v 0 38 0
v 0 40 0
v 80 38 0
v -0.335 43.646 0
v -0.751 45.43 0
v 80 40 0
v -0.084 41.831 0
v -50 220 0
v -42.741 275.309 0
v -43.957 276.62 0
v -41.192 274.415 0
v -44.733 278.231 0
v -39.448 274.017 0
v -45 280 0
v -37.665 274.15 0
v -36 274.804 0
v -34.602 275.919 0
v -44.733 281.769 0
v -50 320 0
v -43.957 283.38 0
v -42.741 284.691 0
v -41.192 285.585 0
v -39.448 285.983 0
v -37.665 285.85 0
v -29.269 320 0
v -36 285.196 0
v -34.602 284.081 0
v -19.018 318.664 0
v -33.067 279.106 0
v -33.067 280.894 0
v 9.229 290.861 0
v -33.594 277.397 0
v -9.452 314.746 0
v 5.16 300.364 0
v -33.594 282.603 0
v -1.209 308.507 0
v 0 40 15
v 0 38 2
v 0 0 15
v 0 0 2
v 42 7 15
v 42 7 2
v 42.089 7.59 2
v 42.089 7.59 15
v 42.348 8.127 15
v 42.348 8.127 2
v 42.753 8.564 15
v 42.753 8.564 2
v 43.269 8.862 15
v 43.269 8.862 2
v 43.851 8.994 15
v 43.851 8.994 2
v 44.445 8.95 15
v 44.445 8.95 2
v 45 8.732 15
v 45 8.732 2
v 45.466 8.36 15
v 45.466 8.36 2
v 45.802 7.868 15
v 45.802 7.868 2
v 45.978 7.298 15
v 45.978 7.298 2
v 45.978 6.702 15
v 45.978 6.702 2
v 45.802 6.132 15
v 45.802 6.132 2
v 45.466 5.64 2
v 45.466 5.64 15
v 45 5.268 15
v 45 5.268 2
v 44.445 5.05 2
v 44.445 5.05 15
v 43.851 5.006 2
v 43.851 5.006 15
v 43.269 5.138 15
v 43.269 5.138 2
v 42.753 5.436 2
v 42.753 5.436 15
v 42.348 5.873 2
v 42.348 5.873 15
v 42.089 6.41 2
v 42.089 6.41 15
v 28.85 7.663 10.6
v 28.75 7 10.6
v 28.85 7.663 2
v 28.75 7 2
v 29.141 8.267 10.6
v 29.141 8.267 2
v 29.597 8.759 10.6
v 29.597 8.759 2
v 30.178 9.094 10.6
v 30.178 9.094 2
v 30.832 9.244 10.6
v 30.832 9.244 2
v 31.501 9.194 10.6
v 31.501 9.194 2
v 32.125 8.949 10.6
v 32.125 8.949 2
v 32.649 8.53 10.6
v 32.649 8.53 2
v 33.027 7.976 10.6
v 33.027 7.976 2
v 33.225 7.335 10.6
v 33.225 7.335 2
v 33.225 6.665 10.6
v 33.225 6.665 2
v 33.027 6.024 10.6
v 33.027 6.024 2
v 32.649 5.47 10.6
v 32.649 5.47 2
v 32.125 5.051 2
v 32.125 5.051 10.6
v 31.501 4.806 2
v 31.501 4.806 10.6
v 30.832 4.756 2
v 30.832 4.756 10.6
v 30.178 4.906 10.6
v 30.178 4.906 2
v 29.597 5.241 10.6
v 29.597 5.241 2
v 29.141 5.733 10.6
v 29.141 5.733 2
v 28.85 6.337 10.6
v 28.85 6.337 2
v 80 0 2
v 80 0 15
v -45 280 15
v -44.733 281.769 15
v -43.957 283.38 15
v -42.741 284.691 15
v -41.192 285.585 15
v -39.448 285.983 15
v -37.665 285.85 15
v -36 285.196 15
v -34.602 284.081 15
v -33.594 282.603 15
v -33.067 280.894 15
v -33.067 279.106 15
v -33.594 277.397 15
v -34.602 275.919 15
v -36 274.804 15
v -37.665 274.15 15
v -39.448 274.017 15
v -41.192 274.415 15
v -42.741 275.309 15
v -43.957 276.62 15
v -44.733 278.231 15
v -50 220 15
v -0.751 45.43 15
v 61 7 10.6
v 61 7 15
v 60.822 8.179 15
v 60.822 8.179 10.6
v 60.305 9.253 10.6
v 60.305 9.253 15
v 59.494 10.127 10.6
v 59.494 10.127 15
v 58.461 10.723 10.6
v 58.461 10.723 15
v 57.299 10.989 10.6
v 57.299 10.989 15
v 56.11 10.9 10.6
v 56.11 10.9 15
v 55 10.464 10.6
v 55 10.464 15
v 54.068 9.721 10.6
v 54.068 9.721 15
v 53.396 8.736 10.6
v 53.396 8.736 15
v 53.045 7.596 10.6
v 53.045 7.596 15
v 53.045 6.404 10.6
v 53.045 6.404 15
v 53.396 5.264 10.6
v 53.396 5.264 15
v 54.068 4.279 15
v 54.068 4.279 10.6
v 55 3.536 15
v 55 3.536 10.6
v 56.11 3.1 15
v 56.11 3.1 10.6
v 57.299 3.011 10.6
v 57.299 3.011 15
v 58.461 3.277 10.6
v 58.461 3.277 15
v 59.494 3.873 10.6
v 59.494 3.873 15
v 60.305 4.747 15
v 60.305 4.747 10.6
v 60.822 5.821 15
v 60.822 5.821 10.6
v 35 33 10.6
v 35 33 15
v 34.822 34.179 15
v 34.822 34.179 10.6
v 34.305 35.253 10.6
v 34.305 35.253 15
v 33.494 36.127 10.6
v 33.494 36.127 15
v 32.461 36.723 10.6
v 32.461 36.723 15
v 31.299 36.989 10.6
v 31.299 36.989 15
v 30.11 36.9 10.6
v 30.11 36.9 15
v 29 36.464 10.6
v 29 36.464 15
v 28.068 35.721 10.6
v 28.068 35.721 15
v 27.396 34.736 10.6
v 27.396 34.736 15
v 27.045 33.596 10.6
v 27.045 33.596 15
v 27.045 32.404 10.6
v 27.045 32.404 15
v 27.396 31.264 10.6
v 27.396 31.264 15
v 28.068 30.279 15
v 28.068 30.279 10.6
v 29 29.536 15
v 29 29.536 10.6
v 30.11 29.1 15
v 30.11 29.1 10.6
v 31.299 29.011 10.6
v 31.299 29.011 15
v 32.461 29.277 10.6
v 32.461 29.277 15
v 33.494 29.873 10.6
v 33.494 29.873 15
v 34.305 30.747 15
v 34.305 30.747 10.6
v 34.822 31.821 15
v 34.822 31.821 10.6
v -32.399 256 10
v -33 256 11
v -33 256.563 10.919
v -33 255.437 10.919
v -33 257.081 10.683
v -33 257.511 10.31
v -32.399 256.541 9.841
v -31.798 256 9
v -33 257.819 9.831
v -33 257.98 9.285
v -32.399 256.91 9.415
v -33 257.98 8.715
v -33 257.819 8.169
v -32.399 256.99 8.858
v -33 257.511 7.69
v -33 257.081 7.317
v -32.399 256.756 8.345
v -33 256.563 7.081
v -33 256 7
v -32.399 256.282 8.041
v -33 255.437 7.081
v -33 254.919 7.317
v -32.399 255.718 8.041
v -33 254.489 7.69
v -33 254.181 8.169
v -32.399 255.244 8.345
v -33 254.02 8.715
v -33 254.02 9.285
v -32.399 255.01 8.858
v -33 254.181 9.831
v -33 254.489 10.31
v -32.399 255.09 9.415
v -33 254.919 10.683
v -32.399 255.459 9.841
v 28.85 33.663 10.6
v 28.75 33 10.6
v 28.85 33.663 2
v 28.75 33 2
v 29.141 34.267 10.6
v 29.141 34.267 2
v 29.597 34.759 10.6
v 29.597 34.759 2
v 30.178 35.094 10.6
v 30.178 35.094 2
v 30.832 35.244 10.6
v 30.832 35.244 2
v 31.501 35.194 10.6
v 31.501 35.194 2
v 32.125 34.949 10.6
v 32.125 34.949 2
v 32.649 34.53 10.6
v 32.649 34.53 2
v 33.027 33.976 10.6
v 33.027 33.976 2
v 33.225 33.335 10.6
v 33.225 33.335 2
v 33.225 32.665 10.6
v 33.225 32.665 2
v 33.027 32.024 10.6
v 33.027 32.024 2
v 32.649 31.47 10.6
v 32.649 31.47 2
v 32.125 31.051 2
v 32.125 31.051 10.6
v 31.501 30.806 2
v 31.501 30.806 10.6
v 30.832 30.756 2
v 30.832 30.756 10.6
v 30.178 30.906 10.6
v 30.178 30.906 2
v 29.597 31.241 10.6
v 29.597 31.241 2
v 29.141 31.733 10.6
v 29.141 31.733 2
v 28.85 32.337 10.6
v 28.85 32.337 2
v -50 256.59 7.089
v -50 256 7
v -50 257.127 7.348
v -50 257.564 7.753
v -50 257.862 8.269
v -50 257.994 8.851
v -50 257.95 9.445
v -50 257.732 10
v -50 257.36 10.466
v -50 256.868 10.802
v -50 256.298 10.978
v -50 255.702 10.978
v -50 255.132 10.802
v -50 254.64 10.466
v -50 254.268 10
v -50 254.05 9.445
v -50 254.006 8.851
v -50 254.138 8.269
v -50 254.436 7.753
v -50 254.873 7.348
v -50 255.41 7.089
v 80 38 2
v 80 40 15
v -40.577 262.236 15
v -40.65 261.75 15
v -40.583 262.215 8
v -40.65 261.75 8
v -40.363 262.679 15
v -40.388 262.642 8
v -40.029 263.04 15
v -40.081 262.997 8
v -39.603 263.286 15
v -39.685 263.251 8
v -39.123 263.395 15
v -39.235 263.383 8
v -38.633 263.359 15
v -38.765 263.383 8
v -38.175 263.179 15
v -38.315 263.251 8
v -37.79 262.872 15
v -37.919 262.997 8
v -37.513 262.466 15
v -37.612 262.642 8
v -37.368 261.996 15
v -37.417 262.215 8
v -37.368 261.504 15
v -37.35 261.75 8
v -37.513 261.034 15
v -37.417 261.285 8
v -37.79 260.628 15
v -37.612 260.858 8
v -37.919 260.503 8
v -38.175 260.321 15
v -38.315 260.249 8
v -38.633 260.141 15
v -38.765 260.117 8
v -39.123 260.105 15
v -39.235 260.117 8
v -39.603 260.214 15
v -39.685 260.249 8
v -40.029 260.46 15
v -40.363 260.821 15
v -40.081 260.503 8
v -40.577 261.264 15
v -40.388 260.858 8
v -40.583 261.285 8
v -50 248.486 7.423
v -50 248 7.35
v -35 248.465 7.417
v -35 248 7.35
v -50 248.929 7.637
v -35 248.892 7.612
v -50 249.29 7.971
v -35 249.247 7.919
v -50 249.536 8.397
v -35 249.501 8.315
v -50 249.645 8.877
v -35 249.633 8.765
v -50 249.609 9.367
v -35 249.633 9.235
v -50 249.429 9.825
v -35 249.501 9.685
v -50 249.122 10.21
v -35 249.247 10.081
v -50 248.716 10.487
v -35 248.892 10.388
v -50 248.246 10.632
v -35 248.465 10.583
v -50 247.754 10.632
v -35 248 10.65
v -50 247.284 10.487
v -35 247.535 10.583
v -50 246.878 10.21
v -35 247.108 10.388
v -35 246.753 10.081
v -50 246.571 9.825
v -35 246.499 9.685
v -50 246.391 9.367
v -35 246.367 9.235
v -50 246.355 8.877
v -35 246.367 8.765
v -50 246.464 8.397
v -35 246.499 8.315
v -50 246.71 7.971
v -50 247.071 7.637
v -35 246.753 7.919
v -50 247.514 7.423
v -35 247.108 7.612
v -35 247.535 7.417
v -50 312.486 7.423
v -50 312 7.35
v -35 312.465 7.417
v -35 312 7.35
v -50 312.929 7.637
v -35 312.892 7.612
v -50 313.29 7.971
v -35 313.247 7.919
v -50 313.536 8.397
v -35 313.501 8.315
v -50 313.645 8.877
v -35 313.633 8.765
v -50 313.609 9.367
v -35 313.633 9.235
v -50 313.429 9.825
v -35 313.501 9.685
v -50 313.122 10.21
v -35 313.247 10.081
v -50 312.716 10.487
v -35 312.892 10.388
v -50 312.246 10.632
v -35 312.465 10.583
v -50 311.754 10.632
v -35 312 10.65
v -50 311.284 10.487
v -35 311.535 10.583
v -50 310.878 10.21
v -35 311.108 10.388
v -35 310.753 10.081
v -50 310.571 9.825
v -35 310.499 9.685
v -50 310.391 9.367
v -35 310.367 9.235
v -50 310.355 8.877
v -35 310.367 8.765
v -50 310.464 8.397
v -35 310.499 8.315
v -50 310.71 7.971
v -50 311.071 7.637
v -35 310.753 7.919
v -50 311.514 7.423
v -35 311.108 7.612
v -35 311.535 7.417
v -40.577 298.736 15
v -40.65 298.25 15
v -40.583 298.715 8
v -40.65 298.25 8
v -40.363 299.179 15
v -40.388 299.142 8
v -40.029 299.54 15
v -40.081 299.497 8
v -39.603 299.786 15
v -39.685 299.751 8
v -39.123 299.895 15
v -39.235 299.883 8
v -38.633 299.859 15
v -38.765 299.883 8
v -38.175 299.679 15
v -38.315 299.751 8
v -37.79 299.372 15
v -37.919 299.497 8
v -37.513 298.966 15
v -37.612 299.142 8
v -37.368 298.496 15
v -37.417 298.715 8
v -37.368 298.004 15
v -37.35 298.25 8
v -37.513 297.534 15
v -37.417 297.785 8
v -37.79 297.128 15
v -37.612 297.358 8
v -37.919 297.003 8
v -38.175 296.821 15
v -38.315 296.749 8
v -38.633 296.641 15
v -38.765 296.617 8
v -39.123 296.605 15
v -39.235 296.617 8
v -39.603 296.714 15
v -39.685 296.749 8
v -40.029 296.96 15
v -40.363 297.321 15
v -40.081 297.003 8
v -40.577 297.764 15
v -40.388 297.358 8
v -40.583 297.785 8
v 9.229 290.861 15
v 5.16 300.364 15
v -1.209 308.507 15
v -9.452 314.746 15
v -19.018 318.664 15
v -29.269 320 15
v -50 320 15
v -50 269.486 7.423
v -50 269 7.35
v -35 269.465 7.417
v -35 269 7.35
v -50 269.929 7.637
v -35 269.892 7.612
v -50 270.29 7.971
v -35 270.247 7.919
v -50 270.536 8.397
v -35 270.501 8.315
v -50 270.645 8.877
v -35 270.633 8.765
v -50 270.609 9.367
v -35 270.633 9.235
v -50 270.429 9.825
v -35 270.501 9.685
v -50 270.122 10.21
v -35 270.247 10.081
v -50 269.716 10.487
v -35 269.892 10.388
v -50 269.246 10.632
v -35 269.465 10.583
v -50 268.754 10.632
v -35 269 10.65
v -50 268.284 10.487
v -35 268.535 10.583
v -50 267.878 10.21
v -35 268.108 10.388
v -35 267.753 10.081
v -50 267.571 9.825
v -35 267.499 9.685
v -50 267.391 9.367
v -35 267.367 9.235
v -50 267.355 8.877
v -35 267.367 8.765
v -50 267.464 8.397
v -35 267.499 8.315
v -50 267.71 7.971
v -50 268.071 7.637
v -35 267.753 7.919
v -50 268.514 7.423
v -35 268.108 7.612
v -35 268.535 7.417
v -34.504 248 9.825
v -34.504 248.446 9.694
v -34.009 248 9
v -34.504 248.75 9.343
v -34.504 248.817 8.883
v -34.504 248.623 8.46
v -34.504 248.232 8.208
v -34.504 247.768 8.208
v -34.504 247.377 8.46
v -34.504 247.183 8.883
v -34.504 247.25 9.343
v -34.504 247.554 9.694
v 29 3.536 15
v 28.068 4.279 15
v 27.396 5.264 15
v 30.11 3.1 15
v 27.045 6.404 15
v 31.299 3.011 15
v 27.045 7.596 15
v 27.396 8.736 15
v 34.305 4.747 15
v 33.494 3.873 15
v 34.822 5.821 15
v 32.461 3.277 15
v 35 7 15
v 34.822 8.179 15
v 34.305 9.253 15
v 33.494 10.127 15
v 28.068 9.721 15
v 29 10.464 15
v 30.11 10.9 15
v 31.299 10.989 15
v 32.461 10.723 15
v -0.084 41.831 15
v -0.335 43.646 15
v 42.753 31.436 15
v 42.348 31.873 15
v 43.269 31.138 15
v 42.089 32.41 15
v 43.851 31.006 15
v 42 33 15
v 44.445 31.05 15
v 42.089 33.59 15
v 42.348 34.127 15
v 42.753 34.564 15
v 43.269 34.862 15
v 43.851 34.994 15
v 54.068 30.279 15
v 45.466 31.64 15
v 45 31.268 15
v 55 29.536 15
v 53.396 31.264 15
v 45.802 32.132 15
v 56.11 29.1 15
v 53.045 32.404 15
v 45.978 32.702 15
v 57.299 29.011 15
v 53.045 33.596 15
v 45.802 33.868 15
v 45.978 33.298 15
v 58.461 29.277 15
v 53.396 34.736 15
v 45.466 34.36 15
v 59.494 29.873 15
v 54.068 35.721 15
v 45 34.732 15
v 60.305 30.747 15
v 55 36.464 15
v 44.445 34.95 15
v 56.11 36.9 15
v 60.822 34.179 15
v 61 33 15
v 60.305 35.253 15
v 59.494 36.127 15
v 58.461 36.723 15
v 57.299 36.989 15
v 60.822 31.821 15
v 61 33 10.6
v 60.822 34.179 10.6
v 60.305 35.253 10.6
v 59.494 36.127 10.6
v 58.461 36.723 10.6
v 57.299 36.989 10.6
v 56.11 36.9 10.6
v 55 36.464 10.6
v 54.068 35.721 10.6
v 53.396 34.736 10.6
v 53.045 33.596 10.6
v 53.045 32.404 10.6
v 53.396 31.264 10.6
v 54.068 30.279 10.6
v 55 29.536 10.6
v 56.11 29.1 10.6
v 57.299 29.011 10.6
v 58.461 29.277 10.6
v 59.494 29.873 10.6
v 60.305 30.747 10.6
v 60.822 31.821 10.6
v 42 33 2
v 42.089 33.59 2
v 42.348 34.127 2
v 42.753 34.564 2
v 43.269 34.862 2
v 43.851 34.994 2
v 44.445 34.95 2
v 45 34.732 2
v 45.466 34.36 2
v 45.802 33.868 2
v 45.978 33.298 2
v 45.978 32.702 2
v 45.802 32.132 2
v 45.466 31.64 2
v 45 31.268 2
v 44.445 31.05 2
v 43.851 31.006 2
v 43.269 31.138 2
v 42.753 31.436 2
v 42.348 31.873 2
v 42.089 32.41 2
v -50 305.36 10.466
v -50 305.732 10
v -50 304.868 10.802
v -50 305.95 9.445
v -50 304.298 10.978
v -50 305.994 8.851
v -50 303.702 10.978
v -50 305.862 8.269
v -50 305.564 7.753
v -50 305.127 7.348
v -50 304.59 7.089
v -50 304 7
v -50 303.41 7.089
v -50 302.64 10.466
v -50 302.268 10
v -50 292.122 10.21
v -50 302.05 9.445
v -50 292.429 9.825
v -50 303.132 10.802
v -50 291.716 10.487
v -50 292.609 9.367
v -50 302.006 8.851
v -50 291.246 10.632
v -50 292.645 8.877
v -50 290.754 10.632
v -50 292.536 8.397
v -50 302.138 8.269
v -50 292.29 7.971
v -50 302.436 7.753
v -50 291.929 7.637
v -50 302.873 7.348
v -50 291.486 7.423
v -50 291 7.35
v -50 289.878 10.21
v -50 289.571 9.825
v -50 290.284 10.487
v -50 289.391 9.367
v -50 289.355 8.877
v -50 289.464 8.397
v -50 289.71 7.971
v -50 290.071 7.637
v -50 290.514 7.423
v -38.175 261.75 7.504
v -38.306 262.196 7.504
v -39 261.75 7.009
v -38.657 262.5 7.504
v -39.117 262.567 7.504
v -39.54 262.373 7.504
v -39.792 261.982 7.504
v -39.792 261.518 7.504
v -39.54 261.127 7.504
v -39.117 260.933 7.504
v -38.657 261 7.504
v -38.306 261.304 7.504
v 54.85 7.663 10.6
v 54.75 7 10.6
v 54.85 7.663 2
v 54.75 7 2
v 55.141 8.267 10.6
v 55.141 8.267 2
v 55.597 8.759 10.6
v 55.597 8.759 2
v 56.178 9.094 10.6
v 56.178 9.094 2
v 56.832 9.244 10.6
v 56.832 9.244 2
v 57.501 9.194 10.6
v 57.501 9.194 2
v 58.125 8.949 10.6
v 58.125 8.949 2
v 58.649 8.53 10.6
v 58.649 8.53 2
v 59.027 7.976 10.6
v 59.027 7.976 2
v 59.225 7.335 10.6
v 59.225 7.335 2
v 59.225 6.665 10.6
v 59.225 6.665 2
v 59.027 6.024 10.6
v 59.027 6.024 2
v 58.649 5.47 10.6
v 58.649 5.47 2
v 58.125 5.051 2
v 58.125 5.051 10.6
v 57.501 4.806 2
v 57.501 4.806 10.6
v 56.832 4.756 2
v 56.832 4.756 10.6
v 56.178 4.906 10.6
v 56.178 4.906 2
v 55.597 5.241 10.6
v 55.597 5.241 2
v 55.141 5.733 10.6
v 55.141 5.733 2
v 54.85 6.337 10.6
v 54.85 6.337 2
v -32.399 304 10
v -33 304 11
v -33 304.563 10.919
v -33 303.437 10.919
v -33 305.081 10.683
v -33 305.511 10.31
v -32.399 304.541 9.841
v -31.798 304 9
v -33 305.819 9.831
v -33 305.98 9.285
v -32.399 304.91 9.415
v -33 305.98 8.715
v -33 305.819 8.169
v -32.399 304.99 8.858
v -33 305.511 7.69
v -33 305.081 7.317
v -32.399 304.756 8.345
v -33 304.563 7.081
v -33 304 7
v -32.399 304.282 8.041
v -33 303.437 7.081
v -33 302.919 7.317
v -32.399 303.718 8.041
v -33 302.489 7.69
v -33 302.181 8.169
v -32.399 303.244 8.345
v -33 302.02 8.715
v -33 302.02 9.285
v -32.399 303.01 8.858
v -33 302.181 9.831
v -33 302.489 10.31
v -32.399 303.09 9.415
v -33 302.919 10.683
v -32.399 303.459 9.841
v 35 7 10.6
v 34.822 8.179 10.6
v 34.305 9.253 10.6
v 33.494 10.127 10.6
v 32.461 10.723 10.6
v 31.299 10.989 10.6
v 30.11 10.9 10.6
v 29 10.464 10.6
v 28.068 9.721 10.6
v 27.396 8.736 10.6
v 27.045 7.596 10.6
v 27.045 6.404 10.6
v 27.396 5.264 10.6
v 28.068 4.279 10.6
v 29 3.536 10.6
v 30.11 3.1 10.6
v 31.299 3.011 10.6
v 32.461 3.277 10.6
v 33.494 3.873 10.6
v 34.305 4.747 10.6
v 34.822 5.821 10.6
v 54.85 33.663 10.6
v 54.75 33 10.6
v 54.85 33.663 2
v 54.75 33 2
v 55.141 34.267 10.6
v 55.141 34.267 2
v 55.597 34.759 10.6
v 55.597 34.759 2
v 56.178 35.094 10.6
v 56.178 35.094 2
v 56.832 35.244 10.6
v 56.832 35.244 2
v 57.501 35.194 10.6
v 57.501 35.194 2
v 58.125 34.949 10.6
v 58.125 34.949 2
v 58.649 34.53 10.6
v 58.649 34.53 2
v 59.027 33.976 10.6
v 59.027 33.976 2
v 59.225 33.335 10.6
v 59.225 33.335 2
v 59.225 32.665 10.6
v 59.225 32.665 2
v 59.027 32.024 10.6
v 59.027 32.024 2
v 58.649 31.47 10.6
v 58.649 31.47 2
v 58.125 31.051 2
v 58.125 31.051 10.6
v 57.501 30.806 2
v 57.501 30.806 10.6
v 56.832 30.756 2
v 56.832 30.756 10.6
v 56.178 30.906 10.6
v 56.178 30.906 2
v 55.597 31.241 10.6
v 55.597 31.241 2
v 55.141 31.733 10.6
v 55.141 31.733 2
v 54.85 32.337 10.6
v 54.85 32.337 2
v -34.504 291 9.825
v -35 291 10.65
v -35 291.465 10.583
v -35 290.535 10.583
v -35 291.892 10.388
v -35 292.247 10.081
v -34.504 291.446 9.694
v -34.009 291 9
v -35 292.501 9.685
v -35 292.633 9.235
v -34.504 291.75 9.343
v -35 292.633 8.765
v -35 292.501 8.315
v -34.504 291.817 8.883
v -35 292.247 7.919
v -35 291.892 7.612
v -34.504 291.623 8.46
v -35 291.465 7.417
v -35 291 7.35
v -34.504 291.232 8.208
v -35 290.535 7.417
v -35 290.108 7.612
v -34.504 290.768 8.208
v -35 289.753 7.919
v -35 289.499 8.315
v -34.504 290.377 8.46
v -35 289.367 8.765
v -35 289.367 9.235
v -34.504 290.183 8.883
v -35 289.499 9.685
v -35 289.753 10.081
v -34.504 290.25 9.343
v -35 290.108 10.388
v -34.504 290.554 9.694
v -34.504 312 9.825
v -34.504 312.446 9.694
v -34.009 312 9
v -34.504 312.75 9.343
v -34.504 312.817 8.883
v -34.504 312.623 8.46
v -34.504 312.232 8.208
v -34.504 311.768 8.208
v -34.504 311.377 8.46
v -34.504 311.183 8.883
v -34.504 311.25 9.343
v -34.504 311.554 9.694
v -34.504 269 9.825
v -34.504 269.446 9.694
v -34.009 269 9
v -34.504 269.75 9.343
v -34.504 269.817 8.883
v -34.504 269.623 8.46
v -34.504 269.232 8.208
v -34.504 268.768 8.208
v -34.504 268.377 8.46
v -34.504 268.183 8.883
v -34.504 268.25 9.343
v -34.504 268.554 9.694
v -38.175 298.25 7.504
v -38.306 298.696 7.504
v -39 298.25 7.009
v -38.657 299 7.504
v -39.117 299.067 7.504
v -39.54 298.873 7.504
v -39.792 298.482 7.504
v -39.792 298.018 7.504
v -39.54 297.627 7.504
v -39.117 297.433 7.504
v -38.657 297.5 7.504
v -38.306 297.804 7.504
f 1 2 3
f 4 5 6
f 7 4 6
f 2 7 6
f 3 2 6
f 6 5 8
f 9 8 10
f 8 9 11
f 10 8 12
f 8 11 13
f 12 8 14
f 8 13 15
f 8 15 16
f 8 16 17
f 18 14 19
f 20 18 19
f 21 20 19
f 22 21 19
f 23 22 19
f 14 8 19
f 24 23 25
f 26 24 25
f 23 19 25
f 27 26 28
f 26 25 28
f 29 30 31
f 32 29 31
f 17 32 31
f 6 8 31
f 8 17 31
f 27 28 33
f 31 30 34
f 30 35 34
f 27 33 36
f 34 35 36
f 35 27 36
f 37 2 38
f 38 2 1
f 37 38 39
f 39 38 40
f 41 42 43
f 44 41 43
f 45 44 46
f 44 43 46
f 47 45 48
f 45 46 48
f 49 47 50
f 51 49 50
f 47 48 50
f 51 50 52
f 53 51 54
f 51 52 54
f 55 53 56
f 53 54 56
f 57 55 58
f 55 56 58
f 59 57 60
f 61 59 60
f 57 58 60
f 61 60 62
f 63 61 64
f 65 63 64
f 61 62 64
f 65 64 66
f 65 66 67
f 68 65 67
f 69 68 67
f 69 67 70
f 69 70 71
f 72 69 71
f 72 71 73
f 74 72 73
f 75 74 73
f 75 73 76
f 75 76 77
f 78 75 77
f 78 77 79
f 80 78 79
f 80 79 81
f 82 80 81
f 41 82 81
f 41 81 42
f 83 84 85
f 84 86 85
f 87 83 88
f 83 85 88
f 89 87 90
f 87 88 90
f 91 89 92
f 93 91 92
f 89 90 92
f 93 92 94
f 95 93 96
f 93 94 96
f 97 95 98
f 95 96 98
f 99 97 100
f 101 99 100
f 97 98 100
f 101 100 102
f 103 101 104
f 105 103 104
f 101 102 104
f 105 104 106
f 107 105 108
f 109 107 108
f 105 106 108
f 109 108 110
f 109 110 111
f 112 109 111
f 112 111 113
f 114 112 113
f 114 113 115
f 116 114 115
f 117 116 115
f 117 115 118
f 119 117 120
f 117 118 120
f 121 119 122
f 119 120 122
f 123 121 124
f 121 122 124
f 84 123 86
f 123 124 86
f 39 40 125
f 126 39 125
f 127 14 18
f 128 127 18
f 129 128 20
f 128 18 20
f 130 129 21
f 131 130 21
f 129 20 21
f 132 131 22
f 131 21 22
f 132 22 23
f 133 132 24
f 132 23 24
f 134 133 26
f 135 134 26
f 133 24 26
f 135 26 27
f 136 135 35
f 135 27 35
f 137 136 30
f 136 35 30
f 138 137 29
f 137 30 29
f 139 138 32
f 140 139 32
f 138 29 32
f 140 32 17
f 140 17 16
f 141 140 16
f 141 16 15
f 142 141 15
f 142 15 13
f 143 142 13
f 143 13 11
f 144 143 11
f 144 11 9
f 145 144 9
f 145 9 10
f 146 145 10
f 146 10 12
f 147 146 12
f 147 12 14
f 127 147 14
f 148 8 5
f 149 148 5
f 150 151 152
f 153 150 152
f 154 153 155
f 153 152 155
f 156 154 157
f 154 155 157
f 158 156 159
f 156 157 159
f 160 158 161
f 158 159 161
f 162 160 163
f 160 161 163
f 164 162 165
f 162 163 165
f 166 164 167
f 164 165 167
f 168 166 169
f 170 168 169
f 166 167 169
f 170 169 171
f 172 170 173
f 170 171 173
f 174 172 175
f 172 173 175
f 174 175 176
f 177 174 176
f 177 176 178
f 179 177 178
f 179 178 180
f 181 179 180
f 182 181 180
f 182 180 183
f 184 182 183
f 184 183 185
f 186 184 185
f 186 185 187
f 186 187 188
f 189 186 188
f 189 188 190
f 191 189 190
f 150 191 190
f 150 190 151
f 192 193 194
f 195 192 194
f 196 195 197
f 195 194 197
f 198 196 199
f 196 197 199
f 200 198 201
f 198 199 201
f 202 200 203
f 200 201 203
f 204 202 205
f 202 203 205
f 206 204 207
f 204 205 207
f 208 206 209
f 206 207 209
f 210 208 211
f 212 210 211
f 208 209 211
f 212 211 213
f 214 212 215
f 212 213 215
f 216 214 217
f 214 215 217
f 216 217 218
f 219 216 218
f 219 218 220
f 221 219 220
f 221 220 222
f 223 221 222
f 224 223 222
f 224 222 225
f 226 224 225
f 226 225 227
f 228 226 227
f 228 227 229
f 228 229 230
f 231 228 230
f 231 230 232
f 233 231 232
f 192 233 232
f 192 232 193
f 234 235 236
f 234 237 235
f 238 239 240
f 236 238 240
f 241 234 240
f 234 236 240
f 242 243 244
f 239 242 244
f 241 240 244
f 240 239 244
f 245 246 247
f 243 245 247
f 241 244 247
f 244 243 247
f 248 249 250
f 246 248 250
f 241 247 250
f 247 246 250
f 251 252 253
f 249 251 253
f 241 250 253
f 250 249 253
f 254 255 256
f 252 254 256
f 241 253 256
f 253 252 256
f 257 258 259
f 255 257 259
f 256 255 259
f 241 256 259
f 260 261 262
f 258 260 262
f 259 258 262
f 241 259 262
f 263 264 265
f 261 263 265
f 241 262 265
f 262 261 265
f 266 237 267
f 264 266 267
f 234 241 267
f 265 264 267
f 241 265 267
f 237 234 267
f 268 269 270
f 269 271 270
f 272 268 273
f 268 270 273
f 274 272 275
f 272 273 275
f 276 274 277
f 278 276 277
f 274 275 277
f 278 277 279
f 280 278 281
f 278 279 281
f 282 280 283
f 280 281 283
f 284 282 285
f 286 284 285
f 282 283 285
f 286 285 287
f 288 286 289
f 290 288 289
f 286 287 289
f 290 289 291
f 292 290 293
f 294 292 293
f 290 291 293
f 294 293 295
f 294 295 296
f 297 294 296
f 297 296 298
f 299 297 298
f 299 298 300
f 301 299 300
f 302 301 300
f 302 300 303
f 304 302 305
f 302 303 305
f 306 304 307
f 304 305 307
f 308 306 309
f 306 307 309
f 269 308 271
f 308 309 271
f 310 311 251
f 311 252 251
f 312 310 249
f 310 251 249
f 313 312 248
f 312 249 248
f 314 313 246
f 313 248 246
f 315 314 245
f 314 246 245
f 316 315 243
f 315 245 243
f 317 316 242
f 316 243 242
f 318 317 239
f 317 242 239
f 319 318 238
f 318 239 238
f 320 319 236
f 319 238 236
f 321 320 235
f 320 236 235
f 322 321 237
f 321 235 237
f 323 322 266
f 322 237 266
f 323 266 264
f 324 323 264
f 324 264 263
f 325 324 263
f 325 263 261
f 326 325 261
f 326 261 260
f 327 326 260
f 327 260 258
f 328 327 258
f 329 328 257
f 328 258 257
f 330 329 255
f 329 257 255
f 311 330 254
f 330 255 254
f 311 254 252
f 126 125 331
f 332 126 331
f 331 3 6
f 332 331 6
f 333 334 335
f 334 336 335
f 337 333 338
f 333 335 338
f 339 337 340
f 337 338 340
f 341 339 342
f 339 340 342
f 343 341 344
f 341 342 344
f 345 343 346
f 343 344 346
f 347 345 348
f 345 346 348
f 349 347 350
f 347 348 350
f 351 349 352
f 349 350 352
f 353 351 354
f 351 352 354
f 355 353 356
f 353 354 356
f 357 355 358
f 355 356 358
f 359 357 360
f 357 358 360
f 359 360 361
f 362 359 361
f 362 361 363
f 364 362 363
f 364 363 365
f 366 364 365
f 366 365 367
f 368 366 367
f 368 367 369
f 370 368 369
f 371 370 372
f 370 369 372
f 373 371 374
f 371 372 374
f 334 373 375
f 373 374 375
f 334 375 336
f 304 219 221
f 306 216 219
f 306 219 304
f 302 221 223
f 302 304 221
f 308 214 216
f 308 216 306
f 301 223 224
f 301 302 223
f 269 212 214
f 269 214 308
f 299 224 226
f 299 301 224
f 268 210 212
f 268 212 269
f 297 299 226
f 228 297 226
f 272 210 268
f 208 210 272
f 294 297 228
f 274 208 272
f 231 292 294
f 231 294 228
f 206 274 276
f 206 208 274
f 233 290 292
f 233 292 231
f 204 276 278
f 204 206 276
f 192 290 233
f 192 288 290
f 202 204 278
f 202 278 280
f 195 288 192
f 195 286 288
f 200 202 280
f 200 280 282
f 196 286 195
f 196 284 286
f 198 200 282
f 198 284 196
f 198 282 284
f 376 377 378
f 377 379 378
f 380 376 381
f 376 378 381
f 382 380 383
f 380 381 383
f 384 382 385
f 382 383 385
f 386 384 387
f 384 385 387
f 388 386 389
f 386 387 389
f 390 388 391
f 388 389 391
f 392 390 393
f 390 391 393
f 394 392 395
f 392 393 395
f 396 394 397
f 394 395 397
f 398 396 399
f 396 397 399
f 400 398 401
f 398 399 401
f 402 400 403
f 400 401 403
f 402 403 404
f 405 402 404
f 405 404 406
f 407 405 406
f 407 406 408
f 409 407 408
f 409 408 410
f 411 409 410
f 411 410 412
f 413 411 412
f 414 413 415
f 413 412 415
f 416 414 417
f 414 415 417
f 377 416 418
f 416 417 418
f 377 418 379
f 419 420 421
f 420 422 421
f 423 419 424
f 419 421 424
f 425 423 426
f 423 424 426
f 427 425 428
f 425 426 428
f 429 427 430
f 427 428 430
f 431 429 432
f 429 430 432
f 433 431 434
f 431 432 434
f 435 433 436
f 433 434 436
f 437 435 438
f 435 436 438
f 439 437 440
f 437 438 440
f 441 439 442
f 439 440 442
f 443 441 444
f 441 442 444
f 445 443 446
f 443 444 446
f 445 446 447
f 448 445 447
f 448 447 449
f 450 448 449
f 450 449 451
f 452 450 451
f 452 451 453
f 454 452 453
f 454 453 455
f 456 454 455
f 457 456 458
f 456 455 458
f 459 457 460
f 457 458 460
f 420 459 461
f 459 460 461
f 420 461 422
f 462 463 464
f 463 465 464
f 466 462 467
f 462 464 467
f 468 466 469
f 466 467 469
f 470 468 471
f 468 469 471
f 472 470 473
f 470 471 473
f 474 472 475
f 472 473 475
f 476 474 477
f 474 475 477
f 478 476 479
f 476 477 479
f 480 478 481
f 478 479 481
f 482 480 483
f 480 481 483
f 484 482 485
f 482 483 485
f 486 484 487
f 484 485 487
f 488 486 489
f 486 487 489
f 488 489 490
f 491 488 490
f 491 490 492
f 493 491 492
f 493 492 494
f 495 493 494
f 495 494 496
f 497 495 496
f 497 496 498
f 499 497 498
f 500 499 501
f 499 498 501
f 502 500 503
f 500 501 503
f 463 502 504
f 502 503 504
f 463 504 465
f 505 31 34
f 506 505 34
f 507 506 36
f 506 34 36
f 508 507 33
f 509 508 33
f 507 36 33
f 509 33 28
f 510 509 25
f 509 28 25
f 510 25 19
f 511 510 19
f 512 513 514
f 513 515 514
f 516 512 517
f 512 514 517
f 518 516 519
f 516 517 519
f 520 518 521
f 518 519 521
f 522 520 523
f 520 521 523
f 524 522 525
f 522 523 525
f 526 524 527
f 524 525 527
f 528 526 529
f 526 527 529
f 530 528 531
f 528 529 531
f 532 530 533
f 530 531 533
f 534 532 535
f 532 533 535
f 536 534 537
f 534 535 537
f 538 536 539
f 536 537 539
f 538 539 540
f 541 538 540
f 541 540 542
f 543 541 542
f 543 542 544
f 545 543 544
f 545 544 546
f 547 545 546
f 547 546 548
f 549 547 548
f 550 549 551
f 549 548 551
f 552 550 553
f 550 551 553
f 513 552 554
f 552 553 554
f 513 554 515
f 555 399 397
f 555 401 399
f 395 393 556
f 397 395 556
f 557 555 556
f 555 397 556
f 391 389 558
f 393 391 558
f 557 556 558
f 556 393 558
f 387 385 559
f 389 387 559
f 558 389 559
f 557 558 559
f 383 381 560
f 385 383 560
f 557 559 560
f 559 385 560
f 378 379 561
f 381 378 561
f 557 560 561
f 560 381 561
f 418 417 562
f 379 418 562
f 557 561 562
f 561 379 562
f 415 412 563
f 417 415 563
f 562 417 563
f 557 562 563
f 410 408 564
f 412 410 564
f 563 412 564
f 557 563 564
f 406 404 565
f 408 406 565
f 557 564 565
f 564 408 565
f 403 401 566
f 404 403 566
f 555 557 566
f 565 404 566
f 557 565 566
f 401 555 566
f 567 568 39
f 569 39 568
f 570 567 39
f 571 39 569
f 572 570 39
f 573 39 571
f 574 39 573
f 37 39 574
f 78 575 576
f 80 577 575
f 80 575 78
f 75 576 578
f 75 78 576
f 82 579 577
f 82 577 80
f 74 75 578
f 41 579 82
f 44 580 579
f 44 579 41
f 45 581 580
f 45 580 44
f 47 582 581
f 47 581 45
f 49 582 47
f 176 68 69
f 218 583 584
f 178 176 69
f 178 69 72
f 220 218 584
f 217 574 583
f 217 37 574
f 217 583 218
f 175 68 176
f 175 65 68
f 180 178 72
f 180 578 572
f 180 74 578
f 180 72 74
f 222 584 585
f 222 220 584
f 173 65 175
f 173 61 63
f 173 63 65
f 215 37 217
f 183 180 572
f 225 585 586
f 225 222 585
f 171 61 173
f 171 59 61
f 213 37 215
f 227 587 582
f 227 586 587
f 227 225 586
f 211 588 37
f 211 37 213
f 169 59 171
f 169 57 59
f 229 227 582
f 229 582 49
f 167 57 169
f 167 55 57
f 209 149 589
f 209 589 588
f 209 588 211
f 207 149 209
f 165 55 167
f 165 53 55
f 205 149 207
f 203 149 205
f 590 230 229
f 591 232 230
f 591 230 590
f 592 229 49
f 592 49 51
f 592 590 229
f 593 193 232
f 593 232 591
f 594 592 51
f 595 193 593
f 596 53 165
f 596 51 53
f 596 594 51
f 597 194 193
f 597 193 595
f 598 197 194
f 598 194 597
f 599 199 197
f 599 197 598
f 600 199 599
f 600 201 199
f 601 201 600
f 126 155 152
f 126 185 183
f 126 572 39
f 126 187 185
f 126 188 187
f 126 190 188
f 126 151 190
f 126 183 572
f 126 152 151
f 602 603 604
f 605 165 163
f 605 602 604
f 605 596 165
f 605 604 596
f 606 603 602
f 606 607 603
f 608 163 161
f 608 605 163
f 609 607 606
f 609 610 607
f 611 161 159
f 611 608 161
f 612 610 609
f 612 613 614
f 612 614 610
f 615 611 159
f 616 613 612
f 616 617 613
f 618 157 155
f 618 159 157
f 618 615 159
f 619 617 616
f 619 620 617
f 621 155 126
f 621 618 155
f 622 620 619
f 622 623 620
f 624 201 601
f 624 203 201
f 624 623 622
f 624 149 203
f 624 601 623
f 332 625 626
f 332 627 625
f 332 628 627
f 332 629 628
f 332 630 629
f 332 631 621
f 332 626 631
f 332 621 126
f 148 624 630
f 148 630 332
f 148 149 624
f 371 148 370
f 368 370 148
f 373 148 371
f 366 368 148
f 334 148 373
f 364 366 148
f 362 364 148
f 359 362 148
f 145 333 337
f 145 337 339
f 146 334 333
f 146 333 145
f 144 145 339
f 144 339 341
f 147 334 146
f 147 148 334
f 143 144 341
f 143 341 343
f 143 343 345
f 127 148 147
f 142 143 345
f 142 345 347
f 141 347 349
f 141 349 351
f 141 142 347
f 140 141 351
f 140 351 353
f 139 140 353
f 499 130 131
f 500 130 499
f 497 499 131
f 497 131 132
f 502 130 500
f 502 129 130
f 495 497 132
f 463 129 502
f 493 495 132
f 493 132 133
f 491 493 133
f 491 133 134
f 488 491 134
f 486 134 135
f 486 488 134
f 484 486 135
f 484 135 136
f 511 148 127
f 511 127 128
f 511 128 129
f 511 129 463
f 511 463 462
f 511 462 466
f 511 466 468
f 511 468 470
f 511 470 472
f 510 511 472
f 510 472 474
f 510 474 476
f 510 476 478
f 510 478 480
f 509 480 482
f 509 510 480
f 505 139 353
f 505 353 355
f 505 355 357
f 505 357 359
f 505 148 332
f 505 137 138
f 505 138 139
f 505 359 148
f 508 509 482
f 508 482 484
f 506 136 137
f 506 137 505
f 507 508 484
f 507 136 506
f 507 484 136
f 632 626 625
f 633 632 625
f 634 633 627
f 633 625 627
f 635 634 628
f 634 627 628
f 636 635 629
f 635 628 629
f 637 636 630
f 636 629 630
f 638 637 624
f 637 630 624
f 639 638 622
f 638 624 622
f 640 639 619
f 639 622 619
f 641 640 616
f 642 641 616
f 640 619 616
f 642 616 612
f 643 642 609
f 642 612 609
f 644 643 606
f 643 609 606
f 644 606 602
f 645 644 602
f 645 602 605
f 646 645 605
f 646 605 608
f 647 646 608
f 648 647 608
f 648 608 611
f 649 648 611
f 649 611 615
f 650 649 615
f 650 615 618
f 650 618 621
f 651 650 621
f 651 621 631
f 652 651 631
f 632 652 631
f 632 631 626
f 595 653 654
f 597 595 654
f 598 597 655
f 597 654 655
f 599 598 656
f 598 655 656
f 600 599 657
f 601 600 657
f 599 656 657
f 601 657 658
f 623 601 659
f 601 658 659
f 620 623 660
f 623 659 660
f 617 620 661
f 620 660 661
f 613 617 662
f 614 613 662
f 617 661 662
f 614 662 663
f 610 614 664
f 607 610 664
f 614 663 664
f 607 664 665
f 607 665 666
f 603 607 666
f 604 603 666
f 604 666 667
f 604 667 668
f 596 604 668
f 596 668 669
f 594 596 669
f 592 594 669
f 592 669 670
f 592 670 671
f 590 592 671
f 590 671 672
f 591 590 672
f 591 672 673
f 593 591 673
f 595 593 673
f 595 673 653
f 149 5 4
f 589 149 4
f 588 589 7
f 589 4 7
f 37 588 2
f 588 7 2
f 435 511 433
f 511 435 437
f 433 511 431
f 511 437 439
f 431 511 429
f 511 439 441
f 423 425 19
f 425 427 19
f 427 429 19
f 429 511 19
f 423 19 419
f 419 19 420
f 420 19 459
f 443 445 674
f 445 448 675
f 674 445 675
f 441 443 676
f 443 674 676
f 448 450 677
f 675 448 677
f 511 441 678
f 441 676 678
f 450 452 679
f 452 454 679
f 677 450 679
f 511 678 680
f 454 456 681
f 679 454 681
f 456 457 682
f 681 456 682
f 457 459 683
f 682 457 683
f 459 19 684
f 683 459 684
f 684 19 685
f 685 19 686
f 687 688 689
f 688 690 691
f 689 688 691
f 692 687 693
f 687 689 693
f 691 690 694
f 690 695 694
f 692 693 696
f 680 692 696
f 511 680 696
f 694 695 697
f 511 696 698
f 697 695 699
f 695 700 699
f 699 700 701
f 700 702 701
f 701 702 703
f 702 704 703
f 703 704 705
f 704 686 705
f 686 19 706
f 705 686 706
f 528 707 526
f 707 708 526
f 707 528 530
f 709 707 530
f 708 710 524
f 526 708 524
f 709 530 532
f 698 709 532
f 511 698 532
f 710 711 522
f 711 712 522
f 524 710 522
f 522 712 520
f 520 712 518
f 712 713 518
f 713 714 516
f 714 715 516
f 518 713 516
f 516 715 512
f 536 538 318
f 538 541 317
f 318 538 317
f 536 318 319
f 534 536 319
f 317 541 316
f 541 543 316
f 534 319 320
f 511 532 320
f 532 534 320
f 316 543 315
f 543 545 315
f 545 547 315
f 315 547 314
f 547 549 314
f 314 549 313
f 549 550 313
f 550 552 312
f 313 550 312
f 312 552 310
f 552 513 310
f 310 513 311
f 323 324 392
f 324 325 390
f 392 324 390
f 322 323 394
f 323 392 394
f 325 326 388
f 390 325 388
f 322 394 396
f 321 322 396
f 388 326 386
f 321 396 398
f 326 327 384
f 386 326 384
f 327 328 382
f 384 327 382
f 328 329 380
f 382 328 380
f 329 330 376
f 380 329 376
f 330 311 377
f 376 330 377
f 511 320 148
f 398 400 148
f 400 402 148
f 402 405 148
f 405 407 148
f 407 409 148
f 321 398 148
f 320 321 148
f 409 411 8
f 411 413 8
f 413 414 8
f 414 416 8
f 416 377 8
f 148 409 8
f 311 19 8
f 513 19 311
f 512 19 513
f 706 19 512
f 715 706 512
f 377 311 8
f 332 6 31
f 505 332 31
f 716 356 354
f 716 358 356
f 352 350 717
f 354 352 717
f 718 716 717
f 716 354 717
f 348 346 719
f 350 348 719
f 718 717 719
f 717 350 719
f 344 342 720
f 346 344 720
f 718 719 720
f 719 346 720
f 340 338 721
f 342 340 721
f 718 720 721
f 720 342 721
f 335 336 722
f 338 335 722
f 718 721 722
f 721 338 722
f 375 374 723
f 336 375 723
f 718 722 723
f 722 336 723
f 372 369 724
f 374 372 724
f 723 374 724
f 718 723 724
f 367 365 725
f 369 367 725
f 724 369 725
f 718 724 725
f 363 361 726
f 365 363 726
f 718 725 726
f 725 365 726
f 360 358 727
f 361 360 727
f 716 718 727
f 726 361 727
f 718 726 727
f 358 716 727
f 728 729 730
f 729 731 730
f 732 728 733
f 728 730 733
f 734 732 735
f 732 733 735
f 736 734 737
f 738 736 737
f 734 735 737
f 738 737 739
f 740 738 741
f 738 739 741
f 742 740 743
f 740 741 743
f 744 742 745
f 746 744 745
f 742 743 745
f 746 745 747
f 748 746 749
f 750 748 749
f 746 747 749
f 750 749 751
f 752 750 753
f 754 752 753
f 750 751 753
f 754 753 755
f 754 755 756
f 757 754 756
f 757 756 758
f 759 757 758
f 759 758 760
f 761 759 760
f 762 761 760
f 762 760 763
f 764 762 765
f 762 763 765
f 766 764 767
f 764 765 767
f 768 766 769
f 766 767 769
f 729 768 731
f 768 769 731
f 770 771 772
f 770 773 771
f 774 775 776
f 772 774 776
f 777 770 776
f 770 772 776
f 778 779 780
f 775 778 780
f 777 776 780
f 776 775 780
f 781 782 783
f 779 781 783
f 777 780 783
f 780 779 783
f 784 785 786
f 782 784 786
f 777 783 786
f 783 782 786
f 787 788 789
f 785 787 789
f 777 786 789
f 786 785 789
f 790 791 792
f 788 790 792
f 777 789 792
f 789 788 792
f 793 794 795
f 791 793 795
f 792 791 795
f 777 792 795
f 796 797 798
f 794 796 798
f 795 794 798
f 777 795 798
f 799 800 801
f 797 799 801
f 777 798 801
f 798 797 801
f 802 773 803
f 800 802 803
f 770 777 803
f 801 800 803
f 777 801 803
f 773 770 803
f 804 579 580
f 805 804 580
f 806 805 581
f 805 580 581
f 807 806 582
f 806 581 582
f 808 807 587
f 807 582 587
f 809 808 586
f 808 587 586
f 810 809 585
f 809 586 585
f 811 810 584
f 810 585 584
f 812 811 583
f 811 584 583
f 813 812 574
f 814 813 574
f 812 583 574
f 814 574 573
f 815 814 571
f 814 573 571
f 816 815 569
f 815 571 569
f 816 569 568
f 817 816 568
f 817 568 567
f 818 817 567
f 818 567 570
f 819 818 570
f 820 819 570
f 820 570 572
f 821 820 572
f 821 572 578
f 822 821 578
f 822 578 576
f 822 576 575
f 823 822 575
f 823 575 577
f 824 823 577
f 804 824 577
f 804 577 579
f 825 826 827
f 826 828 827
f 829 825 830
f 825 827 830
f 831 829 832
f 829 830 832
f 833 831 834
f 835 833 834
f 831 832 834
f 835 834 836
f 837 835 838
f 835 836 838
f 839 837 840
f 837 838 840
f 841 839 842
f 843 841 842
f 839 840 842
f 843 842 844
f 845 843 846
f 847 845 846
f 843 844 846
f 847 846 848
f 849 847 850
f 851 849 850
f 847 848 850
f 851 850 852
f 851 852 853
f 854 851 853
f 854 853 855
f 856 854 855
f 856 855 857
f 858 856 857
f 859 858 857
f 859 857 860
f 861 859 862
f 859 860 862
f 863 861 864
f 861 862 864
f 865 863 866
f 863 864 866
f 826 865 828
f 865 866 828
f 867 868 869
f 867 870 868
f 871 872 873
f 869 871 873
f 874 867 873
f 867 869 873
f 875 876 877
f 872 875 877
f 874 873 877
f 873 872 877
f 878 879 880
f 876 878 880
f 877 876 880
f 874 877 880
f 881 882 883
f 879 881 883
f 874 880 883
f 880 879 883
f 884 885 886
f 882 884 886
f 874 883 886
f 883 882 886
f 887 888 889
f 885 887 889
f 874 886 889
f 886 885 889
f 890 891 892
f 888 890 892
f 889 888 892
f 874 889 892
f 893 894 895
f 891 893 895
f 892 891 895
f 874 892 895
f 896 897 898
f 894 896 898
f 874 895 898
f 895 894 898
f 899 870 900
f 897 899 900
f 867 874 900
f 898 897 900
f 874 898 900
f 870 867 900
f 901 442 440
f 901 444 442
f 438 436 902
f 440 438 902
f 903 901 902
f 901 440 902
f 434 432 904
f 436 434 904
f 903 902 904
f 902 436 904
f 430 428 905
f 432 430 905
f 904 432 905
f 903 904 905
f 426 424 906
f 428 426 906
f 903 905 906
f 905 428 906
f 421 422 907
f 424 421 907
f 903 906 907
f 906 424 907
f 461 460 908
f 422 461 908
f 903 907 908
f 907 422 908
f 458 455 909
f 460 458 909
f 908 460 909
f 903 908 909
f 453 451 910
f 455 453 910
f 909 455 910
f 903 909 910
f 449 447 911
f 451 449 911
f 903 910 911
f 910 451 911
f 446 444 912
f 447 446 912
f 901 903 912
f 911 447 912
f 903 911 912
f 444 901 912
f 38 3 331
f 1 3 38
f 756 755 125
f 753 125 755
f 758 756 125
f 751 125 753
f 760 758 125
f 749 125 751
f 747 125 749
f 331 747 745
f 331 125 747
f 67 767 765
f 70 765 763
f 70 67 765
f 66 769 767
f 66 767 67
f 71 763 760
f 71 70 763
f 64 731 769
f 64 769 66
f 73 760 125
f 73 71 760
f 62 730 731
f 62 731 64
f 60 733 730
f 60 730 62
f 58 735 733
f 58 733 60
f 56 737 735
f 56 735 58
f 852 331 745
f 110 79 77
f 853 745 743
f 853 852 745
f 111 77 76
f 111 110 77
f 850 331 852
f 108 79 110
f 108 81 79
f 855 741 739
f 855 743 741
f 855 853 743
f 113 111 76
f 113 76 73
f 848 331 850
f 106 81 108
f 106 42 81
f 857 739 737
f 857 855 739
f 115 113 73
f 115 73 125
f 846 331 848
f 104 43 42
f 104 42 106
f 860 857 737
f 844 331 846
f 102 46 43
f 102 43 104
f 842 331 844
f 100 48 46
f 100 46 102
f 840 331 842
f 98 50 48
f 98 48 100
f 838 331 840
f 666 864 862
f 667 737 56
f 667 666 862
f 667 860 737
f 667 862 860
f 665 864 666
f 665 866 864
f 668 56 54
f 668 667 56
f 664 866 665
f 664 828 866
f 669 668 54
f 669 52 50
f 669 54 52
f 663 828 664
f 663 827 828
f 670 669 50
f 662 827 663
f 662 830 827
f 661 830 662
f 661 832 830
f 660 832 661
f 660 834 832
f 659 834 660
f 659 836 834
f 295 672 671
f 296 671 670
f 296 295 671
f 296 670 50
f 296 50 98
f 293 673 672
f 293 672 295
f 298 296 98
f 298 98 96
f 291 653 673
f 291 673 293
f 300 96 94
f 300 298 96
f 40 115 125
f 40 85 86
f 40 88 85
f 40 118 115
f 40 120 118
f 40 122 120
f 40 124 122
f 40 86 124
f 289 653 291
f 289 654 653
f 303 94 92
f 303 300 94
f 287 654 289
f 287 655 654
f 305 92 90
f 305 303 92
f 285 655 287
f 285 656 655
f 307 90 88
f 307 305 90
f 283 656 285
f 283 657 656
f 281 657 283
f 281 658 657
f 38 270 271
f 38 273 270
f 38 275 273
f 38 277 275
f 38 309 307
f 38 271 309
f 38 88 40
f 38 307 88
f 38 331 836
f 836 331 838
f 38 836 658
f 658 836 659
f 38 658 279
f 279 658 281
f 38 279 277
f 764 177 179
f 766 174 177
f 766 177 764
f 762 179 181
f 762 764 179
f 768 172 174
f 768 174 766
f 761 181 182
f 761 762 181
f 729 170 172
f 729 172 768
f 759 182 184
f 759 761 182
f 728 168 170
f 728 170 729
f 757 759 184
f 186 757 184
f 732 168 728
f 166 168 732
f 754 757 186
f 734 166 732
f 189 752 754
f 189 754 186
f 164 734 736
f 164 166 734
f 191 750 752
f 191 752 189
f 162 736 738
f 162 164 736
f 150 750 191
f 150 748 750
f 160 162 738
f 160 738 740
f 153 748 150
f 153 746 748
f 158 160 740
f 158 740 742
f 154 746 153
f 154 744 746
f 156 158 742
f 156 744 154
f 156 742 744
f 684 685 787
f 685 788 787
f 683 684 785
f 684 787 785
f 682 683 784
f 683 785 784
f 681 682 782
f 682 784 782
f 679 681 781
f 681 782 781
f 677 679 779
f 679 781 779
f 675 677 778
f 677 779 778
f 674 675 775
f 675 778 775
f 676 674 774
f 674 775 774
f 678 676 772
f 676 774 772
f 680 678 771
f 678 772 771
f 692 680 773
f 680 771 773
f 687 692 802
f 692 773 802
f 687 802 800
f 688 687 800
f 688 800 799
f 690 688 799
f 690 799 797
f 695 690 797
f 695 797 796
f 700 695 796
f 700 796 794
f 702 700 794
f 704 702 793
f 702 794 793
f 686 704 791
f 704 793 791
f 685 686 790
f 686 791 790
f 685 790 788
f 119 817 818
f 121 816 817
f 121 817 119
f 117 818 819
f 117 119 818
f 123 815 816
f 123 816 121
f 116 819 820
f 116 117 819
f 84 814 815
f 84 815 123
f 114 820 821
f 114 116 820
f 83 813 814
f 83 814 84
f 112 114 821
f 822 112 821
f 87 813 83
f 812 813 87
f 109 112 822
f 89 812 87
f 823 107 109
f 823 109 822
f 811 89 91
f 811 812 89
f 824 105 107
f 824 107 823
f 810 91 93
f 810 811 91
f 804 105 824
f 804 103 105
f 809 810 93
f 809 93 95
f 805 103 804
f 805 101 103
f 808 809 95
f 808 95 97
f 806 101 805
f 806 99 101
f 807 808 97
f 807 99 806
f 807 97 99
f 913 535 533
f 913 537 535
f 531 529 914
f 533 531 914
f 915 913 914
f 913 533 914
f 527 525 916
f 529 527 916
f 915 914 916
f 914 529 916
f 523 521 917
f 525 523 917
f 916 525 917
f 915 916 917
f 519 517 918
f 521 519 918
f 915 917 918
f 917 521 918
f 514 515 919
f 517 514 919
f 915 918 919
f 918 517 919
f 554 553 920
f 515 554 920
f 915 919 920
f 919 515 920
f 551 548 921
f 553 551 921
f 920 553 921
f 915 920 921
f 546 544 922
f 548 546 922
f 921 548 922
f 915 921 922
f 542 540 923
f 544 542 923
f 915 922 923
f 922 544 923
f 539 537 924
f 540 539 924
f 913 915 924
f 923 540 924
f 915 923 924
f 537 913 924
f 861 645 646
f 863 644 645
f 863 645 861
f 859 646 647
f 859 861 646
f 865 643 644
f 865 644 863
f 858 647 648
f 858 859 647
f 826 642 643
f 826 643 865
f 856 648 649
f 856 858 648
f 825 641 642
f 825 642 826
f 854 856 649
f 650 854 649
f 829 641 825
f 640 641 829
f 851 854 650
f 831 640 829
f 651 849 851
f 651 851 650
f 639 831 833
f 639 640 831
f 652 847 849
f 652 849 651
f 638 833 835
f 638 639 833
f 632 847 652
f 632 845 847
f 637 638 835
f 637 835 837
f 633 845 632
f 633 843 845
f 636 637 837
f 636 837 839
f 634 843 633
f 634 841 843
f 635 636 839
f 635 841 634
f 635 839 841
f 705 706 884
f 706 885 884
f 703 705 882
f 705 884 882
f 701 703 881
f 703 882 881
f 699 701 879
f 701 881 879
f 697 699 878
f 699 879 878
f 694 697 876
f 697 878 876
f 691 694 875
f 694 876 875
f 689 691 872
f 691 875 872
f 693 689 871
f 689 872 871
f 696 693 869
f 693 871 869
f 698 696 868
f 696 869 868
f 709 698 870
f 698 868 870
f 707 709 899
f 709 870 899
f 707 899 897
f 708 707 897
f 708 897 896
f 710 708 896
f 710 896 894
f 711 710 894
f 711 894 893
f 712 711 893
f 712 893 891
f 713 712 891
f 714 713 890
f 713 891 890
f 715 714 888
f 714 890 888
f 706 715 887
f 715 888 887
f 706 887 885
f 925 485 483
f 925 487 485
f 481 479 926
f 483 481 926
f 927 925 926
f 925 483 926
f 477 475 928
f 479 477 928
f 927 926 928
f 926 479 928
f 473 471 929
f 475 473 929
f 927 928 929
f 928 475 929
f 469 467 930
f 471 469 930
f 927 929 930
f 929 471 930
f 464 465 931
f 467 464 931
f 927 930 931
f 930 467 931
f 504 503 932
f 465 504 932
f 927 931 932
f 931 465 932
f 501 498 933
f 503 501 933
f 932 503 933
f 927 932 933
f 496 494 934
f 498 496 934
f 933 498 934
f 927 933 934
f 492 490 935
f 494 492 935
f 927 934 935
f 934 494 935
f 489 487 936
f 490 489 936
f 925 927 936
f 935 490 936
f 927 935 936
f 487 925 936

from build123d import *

# Parameters (mm, degrees)
SALIENTE_EXTRUIR1_DEPTH                              = 15
CROQUIS2_R                                           = 6
CORTAR_EXTRUIR1_DEPTH                                = 16
PERFORADOR_PARA_ROSCAR_PARA_MACHO_DE_ROS_D           = 3.3
PERFORADOR_PARA_ROSCAR_PARA_MACHO_DE_ROS_DEPTH       = 7
PERFORADOR_PARA_ROSCAR_PARA_MACHO_DE_ROS_TIP         = 0.991420021
CROQUIS9_W                                           = 80
CROQUIS9_H                                           = 38
CORTAR_EXTRUIR2_DEPTH                                = 2
TALADRO_ROSCADO_M41_D                                = 3.3
TALADRO_ROSCADO_M41_DEPTH                            = 15
TALADRO_ROSCADO_M41_TIP                              = 0.991420021
TALADROS_DE_ESPIGA_DE_4_0MM1_D                       = 4
TALADROS_DE_ESPIGA_DE_4_0MM1_DEPTH                   = 17
TALADROS_DE_ESPIGA_DE_4_0MM1_TIP                     = 1.201721238
TALADROS_DE_ESPIGA_DE_4_0MM3_D                       = 4
REFRENTADO_PARA_TORNILLO_CON_CABEZA_HUEC_D           = 4.5
REFRENTADO_PARA_TORNILLO_CON_CABEZA_HUEC_CBORE_D     = 8
REFRENTADO_PARA_TORNILLO_CON_CABEZA_HUEC_CBORE_DEPTH = 4.4


with BuildPart() as part:
    # Croquis1 → Saliente-Extruir1 (new body)
    with BuildSketch(Plane.XY):
        with BuildLine():
            Line((80, 0), (80, 40))
            Line((80, 40), (9.228509485, 290.860669242))
            ThreePointArc((9.228509485, 290.860669242), (-5.12786552, 311.893782856), (-29.268839302, 320))
            Line((-29.268839302, 320), (-50, 320))
            Line((-50, 320), (-50, 220))
            Line((-50, 220), (-0.751325607, 45.430334621))
            ThreePointArc((-0.751325607, 45.430334621), (-0.1887218, 42.741031935), (0, 40))
            Line((0, 40), (0, 0))
            Line((0, 0), (80, 0))
        make_face()
    extrude(amount=SALIENTE_EXTRUIR1_DEPTH)

    # Croquis2 → Cortar-Extruir1 (cut, through all)
    with BuildSketch(Plane(origin=(0, 0, 0), x_dir=(-1, 0, 0), z_dir=(0, 0, -1))):
        with Locations((39, 280)):
            Circle(CROQUIS2_R)
    extrude(amount=-CORTAR_EXTRUIR1_DEPTH, mode=Mode.SUBTRACT)

    # Perforador para roscar para macho de roscar para M44
    with Locations(Plane.XY.offset(15)):
        with Locations((-39, 298.25), (-39, 261.75)):
            Hole(PERFORADOR_PARA_ROSCAR_PARA_MACHO_DE_ROS_D / 2, depth=PERFORADOR_PARA_ROSCAR_PARA_MACHO_DE_ROS_DEPTH)
            with Locations((0, 0, -(PERFORADOR_PARA_ROSCAR_PARA_MACHO_DE_ROS_DEPTH + PERFORADOR_PARA_ROSCAR_PARA_MACHO_DE_ROS_TIP / 2))):  # 118° drill point
                Cone(0, PERFORADOR_PARA_ROSCAR_PARA_MACHO_DE_ROS_D / 2, PERFORADOR_PARA_ROSCAR_PARA_MACHO_DE_ROS_TIP, mode=Mode.SUBTRACT)

    # Croquis9 → Cortar-Extruir2 (cut)
    with BuildSketch(Plane(origin=(0, 0, 0), x_dir=(-1, 0, 0), z_dir=(0, 0, -1))):
        with Locations((-40, 19)):
            Rectangle(CROQUIS9_W, CROQUIS9_H)
    extrude(amount=-CORTAR_EXTRUIR2_DEPTH, mode=Mode.SUBTRACT)

    # Taladro roscado M41
    with Locations(Plane.ZY.offset(50)):
        with Locations((9, 312), (9, 248), (9, 291), (9, 269)):
            Hole(TALADRO_ROSCADO_M41_D / 2, depth=TALADRO_ROSCADO_M41_DEPTH)
            with Locations((0, 0, -(TALADRO_ROSCADO_M41_DEPTH + TALADRO_ROSCADO_M41_TIP / 2))):  # 118° drill point
                Cone(0, TALADRO_ROSCADO_M41_D / 2, TALADRO_ROSCADO_M41_TIP, mode=Mode.SUBTRACT)

    # Taladros de espiga de Ø4.0mm1
    with Locations(Plane.ZY.offset(50)):
        with Locations((9, 304), (9, 256)):
            Hole(TALADROS_DE_ESPIGA_DE_4_0MM1_D / 2, depth=TALADROS_DE_ESPIGA_DE_4_0MM1_DEPTH)
            with Locations((0, 0, -(TALADROS_DE_ESPIGA_DE_4_0MM1_DEPTH + TALADROS_DE_ESPIGA_DE_4_0MM1_TIP / 2))):  # 118° drill point
                Cone(0, TALADROS_DE_ESPIGA_DE_4_0MM1_D / 2, TALADROS_DE_ESPIGA_DE_4_0MM1_TIP, mode=Mode.SUBTRACT)

    # Taladros de espiga de Ø4.0mm3 (through all)
    with Locations(Plane.XY.offset(15)):
        with Locations((44, 33), (44, 7)):
            Hole(TALADROS_DE_ESPIGA_DE_4_0MM3_D / 2)

    # Refrentado para tornillo con cabeza hueca de M41 (through all)
    with Locations(Plane.XY.offset(15)):
        with Locations((57, 33), (31, 7), (31, 33), (57, 7)):
            CounterBoreHole(REFRENTADO_PARA_TORNILLO_CON_CABEZA_HUEC_D / 2, REFRENTADO_PARA_TORNILLO_CON_CABEZA_HUEC_CBORE_D / 2, REFRENTADO_PARA_TORNILLO_CON_CABEZA_HUEC_CBORE_DEPTH)


solid = part.part
